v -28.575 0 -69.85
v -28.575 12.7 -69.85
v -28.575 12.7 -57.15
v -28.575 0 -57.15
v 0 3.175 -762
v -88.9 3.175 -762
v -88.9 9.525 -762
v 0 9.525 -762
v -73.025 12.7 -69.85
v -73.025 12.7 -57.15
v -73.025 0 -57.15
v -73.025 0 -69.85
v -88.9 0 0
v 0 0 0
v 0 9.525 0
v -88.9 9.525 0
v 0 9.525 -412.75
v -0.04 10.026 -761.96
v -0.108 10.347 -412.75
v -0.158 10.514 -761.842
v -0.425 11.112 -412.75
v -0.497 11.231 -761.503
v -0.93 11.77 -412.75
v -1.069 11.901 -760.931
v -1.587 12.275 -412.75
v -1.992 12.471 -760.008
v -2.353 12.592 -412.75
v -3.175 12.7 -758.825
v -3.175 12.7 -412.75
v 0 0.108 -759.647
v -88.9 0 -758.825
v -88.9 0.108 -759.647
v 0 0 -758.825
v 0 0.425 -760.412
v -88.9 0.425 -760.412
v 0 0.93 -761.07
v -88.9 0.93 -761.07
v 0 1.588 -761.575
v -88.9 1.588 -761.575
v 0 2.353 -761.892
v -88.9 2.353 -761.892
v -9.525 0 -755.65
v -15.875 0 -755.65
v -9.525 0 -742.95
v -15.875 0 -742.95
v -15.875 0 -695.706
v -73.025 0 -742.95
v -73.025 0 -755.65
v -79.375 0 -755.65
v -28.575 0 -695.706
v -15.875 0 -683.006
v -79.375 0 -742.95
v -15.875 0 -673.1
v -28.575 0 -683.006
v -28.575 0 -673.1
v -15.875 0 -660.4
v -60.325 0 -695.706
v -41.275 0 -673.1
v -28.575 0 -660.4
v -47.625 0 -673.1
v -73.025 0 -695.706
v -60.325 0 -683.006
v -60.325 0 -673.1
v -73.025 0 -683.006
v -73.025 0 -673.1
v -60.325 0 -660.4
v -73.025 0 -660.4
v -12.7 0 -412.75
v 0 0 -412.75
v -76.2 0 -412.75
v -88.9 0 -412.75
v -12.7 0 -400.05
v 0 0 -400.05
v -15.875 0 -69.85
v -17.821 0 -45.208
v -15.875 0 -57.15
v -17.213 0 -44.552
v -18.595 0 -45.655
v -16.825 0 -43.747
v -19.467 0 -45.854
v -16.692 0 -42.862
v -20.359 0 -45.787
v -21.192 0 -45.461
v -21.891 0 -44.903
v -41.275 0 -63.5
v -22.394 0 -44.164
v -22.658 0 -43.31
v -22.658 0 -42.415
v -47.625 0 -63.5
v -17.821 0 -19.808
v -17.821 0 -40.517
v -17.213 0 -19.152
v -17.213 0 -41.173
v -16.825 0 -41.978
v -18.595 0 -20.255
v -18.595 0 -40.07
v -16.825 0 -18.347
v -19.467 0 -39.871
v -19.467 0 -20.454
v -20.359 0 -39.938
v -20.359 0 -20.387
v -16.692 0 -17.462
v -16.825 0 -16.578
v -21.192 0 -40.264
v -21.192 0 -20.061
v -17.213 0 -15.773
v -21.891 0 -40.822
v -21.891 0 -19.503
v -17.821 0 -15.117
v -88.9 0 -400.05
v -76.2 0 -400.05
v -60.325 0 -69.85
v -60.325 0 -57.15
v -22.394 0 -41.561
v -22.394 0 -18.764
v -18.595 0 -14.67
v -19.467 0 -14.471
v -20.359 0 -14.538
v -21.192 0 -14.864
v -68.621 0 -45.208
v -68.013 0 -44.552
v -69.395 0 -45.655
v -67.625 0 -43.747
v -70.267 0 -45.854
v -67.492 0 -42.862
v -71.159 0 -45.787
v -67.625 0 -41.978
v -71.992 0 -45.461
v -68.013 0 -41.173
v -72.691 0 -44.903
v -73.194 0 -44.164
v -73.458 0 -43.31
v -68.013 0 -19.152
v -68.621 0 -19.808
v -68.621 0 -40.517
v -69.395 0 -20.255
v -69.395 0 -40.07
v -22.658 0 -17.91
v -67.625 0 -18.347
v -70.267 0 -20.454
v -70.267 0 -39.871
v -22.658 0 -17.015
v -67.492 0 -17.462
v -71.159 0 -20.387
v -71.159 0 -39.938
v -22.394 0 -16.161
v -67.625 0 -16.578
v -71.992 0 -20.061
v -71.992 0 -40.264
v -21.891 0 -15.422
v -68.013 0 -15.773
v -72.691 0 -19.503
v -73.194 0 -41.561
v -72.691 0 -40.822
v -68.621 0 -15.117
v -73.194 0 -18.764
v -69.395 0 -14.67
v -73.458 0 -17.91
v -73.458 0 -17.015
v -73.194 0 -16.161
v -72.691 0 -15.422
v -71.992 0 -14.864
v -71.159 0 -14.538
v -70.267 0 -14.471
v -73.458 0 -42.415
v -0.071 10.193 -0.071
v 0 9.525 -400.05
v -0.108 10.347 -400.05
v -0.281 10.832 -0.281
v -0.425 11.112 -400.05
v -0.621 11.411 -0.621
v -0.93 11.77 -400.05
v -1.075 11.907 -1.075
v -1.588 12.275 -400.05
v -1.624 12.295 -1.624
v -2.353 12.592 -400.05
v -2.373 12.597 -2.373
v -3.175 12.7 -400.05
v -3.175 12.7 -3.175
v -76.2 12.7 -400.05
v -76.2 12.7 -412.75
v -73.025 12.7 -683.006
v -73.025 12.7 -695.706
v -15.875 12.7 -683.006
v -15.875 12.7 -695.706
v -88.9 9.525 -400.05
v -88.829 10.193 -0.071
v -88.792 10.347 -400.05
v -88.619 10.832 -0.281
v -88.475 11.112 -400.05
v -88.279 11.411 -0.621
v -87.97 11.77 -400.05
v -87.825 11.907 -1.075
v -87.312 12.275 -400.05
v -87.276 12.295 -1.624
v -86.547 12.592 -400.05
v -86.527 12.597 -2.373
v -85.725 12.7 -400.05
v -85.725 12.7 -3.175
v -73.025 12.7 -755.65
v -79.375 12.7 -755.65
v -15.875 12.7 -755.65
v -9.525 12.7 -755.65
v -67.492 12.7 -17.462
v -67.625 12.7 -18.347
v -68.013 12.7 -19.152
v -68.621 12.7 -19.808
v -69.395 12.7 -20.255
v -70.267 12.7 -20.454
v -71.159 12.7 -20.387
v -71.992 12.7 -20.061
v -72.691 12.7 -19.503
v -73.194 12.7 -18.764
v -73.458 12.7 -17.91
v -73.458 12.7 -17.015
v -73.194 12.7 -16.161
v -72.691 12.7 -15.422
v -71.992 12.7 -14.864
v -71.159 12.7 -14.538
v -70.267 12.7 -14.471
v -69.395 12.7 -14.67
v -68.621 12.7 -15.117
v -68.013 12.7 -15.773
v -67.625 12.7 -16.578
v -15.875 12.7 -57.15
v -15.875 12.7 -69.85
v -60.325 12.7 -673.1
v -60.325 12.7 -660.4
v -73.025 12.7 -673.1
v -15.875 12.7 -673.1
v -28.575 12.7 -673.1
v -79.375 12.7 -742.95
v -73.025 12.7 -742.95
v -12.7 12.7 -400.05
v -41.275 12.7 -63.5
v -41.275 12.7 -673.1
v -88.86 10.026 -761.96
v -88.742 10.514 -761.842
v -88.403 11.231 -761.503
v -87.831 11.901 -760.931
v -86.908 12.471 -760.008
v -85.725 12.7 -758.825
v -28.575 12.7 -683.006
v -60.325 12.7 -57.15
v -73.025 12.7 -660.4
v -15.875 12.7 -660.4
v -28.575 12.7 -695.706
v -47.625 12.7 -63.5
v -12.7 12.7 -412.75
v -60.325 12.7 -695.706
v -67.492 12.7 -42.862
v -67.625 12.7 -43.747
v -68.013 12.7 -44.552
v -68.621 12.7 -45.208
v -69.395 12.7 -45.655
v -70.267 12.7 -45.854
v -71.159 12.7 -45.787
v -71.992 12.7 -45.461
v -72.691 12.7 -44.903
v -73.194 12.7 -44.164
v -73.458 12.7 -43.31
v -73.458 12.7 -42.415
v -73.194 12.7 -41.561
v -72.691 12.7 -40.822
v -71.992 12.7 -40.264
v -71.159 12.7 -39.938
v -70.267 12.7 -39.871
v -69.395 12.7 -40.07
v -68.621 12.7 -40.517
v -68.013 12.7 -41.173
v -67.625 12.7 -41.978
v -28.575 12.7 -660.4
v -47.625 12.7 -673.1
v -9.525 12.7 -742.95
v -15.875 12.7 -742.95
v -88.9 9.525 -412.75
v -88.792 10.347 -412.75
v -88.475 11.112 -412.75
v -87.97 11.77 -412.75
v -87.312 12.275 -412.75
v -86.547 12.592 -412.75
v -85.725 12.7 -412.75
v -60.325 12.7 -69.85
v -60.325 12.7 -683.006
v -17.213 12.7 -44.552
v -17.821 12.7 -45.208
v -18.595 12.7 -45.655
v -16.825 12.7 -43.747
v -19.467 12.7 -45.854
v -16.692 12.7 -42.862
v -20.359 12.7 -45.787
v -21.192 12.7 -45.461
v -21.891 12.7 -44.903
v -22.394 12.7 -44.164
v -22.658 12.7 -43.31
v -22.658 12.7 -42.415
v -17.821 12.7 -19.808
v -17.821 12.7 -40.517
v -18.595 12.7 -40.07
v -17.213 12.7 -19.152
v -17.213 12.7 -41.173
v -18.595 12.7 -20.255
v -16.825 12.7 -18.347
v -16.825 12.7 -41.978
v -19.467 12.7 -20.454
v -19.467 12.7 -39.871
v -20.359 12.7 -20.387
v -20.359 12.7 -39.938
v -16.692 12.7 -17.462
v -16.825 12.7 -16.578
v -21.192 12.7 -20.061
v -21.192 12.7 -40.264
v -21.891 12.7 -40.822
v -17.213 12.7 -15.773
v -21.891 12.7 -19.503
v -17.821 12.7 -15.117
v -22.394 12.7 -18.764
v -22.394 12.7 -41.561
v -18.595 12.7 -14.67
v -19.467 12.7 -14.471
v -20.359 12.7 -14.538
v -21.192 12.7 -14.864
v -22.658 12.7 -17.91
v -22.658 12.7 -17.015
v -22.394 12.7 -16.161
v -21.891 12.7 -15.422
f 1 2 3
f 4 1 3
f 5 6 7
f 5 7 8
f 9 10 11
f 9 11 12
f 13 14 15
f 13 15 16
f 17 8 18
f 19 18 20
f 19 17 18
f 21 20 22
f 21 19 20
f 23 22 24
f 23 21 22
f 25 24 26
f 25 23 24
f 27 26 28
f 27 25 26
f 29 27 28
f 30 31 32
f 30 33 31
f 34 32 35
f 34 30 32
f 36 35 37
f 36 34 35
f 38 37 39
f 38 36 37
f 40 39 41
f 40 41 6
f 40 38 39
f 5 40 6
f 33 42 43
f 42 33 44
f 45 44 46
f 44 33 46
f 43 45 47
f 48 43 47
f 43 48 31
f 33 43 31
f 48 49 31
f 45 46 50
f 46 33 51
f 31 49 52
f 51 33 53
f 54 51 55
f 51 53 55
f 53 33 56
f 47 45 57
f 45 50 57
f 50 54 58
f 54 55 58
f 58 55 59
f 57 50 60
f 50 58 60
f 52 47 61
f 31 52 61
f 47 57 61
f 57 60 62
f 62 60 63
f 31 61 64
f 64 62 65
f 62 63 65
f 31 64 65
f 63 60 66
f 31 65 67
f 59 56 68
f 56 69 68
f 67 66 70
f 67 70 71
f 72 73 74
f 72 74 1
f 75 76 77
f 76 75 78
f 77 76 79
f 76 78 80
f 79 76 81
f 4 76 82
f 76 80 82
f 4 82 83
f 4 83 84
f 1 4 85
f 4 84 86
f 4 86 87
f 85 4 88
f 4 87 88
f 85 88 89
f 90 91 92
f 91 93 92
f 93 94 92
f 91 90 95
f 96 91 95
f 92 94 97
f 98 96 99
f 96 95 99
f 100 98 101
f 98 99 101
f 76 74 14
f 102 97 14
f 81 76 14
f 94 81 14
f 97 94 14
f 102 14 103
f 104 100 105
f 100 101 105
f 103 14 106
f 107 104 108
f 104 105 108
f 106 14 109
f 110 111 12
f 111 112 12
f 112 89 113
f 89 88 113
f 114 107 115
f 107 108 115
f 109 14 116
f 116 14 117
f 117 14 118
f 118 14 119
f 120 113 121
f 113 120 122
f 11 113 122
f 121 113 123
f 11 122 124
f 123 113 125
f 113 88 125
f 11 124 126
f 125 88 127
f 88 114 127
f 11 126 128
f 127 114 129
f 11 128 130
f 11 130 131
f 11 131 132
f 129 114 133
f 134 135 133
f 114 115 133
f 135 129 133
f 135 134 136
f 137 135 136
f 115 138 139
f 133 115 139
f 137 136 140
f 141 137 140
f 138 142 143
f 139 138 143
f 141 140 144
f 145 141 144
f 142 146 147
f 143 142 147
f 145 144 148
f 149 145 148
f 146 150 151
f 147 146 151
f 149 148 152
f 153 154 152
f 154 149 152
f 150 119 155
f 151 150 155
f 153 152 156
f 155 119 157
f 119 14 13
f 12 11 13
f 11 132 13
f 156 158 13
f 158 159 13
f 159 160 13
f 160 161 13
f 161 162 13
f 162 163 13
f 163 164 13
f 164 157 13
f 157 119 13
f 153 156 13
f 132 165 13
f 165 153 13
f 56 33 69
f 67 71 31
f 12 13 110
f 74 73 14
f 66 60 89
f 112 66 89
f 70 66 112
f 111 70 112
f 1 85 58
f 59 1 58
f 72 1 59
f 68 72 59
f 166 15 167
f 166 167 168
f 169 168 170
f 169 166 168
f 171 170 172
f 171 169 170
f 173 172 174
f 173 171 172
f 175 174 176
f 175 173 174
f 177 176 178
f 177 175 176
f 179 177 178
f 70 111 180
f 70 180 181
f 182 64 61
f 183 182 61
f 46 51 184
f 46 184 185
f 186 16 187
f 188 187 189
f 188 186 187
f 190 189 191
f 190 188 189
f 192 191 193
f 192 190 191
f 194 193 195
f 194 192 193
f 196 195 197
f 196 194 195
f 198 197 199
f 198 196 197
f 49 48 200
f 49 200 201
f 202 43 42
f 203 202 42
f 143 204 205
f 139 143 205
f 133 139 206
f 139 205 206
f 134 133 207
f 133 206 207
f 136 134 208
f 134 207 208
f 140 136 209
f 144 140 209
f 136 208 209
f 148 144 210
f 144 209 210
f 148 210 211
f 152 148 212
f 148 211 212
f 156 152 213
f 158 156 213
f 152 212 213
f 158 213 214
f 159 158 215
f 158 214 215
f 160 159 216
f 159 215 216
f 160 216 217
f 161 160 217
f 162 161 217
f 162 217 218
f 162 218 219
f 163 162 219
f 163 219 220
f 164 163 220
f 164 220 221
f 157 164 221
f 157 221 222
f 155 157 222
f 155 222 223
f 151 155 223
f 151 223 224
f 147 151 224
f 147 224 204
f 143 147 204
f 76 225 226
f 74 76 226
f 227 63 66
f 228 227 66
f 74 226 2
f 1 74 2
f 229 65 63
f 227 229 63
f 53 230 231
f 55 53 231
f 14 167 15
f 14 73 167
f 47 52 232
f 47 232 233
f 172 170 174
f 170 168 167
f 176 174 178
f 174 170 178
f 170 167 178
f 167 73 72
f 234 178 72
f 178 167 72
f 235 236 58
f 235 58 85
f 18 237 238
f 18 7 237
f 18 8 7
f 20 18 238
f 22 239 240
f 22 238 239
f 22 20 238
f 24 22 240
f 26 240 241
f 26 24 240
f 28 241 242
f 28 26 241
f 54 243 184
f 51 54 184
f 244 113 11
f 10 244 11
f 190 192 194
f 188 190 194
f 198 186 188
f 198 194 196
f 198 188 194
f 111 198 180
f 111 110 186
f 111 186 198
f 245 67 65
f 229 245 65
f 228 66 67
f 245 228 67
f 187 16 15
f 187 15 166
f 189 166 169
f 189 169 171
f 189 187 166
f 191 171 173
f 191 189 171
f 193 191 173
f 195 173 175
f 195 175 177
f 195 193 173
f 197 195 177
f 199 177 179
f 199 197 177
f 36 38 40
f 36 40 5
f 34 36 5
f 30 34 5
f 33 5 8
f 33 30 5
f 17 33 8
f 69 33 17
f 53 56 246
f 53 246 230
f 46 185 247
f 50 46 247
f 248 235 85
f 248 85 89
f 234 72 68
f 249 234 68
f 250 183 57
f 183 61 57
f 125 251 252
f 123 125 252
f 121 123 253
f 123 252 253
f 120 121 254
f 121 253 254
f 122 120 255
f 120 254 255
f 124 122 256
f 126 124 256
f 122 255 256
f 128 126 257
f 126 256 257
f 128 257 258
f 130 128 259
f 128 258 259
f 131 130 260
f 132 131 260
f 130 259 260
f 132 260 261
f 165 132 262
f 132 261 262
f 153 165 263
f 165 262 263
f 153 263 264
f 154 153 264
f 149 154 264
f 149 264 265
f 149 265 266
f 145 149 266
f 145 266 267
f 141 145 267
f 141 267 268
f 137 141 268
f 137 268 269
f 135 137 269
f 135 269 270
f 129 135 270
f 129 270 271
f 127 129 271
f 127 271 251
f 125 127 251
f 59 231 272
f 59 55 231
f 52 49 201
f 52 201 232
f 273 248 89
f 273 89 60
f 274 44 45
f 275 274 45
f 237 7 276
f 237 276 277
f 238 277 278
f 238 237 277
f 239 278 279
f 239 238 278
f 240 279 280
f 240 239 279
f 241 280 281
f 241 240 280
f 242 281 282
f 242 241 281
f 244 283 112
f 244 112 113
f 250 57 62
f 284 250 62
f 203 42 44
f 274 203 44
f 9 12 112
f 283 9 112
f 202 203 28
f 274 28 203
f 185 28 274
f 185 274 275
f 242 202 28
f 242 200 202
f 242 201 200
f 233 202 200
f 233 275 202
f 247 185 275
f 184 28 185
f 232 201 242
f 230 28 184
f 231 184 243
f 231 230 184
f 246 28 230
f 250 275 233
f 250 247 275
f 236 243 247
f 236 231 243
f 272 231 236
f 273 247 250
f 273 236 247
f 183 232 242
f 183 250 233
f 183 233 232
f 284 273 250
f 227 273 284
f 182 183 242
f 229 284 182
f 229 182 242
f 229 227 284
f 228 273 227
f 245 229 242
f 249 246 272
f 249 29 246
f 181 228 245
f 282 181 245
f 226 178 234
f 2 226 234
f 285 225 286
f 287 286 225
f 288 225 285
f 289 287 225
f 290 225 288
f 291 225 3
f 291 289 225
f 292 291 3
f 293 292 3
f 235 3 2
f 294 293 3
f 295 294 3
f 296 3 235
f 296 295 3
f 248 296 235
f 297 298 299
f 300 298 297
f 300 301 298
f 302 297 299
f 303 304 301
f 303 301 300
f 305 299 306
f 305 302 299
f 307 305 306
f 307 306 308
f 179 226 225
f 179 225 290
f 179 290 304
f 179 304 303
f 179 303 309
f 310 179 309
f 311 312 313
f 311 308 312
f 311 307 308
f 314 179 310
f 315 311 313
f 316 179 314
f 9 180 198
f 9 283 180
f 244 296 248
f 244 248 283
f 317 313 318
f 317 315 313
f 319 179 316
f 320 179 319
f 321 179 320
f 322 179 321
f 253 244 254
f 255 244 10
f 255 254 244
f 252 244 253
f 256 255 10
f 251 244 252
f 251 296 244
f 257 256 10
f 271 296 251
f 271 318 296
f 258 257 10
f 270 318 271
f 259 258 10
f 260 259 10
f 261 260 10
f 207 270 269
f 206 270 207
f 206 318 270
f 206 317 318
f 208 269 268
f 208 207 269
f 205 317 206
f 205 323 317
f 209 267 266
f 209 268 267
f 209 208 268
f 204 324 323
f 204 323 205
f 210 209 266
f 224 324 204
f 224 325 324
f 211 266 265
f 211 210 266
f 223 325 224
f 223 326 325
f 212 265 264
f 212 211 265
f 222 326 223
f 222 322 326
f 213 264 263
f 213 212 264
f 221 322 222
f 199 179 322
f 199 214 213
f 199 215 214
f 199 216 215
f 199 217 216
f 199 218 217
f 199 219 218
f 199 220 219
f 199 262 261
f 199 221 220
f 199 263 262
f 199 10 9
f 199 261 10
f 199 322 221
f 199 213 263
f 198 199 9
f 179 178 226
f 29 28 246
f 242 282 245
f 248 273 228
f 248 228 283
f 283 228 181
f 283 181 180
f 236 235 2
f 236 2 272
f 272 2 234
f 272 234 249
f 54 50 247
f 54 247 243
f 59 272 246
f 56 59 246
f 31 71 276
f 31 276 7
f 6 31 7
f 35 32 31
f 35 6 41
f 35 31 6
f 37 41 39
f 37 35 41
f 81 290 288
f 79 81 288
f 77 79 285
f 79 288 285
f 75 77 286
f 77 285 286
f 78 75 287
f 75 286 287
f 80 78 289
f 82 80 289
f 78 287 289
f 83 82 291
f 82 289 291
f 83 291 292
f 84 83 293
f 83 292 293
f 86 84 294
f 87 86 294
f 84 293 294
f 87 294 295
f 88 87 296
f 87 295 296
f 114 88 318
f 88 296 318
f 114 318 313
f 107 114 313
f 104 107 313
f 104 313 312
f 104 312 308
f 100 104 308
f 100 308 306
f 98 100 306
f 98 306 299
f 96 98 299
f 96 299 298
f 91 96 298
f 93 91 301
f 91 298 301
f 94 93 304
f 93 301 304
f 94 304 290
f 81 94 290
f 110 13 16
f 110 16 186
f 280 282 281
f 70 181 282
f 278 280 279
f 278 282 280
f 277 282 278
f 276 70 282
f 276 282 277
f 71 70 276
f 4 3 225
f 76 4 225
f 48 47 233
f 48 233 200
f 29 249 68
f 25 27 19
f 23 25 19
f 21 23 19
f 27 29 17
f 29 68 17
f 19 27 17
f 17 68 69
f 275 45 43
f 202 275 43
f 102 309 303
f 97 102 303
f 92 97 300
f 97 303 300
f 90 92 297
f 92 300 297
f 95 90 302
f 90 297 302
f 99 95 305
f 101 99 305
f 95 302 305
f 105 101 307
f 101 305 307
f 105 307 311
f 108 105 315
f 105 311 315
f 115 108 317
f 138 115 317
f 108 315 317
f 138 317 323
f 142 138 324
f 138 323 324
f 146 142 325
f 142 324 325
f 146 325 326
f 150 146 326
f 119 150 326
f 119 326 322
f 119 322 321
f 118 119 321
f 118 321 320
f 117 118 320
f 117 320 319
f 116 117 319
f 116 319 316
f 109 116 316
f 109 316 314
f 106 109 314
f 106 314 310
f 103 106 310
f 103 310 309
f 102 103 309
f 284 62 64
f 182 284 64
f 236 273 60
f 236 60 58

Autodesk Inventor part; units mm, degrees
ref_plane "YZ Plane" through (0, 0, 0) normal (1, 0, 0) x (0, 1, 0)
ref_plane "XZ Plane" through (0, 0, 0) normal (0, 1, 0) x (-1, 0, 0)
ref_plane "XY Plane" through (0, 0, 0) normal (0, 0, 1) x (1, 0, 0)
sketch "Sketch1" plane through (0, 0, 0) normal (0, 1, 0) x (-1, 0, 0)
  line L0 (0, 0) -> (88.9, 0)
  line L1 (88.9, -762) -> (0, -762)
  line L2 (0, -762) -> (0, 0)
  line L3 (88.9, 0) -> (0, 0) construction
  line L4 (0, 0) -> (0, -50.8) construction
  line L5 (88.9, 0) -> (88.9, -762)
  dimension "d0" = 88.9
  dimension "d3" = 50.8
  dimension "d47" = 762
extrude "Extrusion3" add sketch "Sketch1" along normal blind 12.7
sketch "Sketch2" plane through (0, 12.7, 0) normal (0, 1, 0) x (1, 0, 0)
  line L0 (0, 762) -> (-88.9, 762) construction
  line L1 (-44.45, 762) -> (666.75, 762) construction
  line L2 (-41.275, 63.5) -> (-47.625, 63.5)
  line L3 (-47.625, 63.5) -> (-47.625, 673.1)
  line L4 (-47.625, 673.1) -> (-41.275, 673.1)
  line L5 (-41.275, 673.1) -> (-41.275, 63.5)
  line L6 (-44.45, 63.5) -> (-44.45, 0) construction
  line L7 (-88.9, 0) -> (0, 0) construction
  dimension "d21" = 6.35
  dimension "d22" = 609.6
  dimension "d25" = 63.5
extrude "Extrusion4" cut sketch "Sketch2" against normal through all
sketch "Sketch3" plane through (0, 0, 0) normal (0, -1, 0) x (1, 0, 0)
  line L0 (-41.275, -673.1) -> (-41.275, -63.5) construction
  line L1 (-41.275, -63.5) -> (-22.225, -63.5) construction
  line L2 (-47.625, -63.5) -> (-41.275, -63.5) construction
  line L3 (-44.45, -63.5) -> (-44.45, 0) construction
  line L4 (-47.625, -63.5) -> (-66.675, -63.5) construction
  line L5 (-28.575, -57.15) -> (-15.875, -57.15)
  line L6 (-15.875, -57.15) -> (-15.875, -69.85)
  line L7 (-15.875, -69.85) -> (-28.575, -69.85)
  line L8 (-28.575, -69.85) -> (-28.575, -57.15)
  line L9 (-28.575, -57.15) -> (-15.875, -69.85) construction
  line L10 (-15.875, -57.15) -> (-28.575, -69.85) construction
  line L11 (-60.325, -57.15) -> (-73.025, -57.15)
  line L12 (-73.025, -57.15) -> (-73.025, -69.85)
  line L13 (-73.025, -69.85) -> (-60.325, -69.85)
  line L14 (-60.325, -69.85) -> (-60.325, -57.15)
  line L15 (-60.325, -57.15) -> (-73.025, -69.85) construction
  line L16 (-73.025, -57.15) -> (-60.325, -69.85) construction
  line L17 (-28.575, -660.4) -> (-15.875, -660.4)
  line L18 (-15.875, -660.4) -> (-15.875, -673.1)
  line L19 (-15.875, -673.1) -> (-28.575, -673.1)
  line L20 (-28.575, -673.1) -> (-28.575, -660.4)
  line L21 (-28.575, -660.4) -> (-15.875, -673.1) construction
  line L22 (-15.875, -660.4) -> (-28.575, -673.1) construction
  line L23 (-60.325, -660.4) -> (-73.025, -660.4)
  line L24 (-73.025, -660.4) -> (-73.025, -673.1)
  line L25 (-73.025, -673.1) -> (-60.325, -673.1)
  line L26 (-60.325, -673.1) -> (-60.325, -660.4)
  line L27 (-60.325, -660.4) -> (-73.025, -673.1) construction
  line L28 (-73.025, -660.4) -> (-60.325, -673.1) construction
  line L29 (-47.625, -673.1) -> (-41.275, -673.1) construction
  line L30 (-28.575, -673.1) -> (-60.325, -673.1) construction
  line L31 (-44.45, -673.1) -> (-44.45, -695.706) construction
  line L32 (-44.45, -673.1) -> (-21.844, -673.1) construction
  line L33 (-28.575, -695.706) -> (-28.575, -683.006)
  line L34 (-15.875, -695.706) -> (-28.575, -695.706)
  line L35 (-15.875, -683.006) -> (-15.875, -695.706)
  line L36 (-15.875, -683.006) -> (-28.575, -695.706) construction
  line L37 (-28.575, -683.006) -> (-15.875, -683.006)
  line L38 (-28.575, -683.006) -> (-15.875, -695.706) construction
  line L39 (-60.325, -695.706) -> (-60.325, -683.006)
  line L40 (-60.325, -683.006) -> (-73.025, -683.006)
  line L41 (-73.025, -683.006) -> (-73.025, -695.706)
  line L42 (-60.325, -683.006) -> (-73.025, -695.706) construction
  line L43 (-73.025, -683.006) -> (-60.325, -695.706) construction
  line L44 (-73.025, -695.706) -> (-60.325, -695.706)
  line L45 (-28.575, -695.706) -> (-60.325, -695.706) construction
  line L46 (0, -762) -> (-88.9, -762) construction
  line L47 (-44.45, -762) -> (-44.45, -755.65) construction
  line L48 (-44.45, -755.65) -> (-15.875, -755.65) construction
  line L49 (-15.875, -755.65) -> (-9.525, -755.65)
  line L50 (-9.525, -755.65) -> (-9.525, -742.95)
  line L51 (-9.525, -742.95) -> (-15.875, -742.95)
  line L52 (-15.875, -742.95) -> (-15.875, -755.65)
  line L53 (-73.025, -755.65) -> (-79.375, -755.65)
  line L54 (-79.375, -755.65) -> (-79.375, -742.95)
  line L55 (-79.375, -742.95) -> (-73.025, -742.95)
  line L56 (-73.025, -742.95) -> (-73.025, -755.65)
  point P0 (0, 0)
  point P1 (-22.225, -666.75)
  point P2 (-66.675, -666.75)
  point P3 (-22.225, -689.356)
  point P4 (-66.675, -689.356)
  point P5 (-21.844, -695.706)
  dimension "d26" = 19.05
  dimension "d27" = 12.7
  dimension "d28" = 12.7
  dimension "d29" = 12.7
  dimension "d30" = 12.7
  dimension "d33" = 12.7
  dimension "d34" = 12.7
  dimension "d35" = 12.7
  dimension "d36" = 12.7
  dimension "d37" = 22.606
  dimension "d38" = 90
  dimension "d39" = 12.7
  dimension "d40" = 12.7
  dimension "d41" = 12.7
  dimension "d42" = 12.7
  dimension "d43" = 6.35
  dimension "d44" = 28.575
  dimension "d45" = 6.35
  dimension "d46" = 12.7
extrude "Extrusion5" cut sketch "Sketch3" against normal through all
sketch "Sketch4" plane through (0, 0, 0) normal (0, -1, 0) x (1, 0, 0)
  line L0 (-88.9, -406.4) -> (0, -406.4) construction
  line L1 (-88.9, -400.05) -> (-76.2, -400.05)
  line L2 (-76.2, -400.05) -> (-76.2, -412.75)
  line L3 (-76.2, -412.75) -> (-88.9, -412.75)
  line L4 (-88.9, -400.05) -> (-88.9, -412.75)
  line L5 (0, -400.05) -> (-12.7, -400.05)
  line L6 (-12.7, -400.05) -> (-12.7, -412.75)
  line L7 (-12.7, -412.75) -> (0, -412.75)
  line L8 (0, -400.05) -> (0, -412.75)
  line L9 (-15.875, -742.95) -> (-15.875, -755.65) construction
  line L10 (-79.375, -755.65) -> (-73.025, -755.65) construction
  line L11 (-15.875, -755.65) -> (-73.025, -755.65) construction
  line L12 (-28.575, -69.85) -> (-28.575, -57.15) construction
  line L13 (-28.575, -57.15) -> (-60.325, -57.15) construction
  line L14 (-44.45, -57.15) -> (-44.45, -755.65) construction
  point P0 (-44.45, -406.4)
  dimension "d49" = 12.7
  dimension "d52" = 12.7
extrude "Extrusion6" cut sketch "Sketch4" against normal through all
fillet "Fillet1" radius 3.175 6 edges at (0, 12.7, -200.025) (-44.45, 12.7, 0) (-88.9, 12.7, -200.025) (0, 12.7, -587.375) (-44.45, 12.7, -762) (-88.9, 12.7, -587.375)
fillet "Fillet2" radius 3.175 1 edges at (-44.45, 0, -762)
sketch "Sketch5" plane through (0, 12.7, 0) normal (0, 1, 0) x (1, 0, 0)
  line L0 (-85.725, 3.175) -> (-85.725, 400.05) construction
  line L1 (-3.175, 400.05) -> (-3.175, 3.175) construction
  line L2 (-85.725, 57.15) -> (-3.175, 57.15) construction
  line L3 (-3.175, 57.15) -> (-3.175, 3.175) construction
  line L4 (-3.175, 3.175) -> (-85.725, 3.175) construction
  line L5 (-85.725, 3.175) -> (-85.725, 57.15) construction
  line L6 (-85.725, 57.15) -> (-4.458, 3.175) construction
  line L7 (-70.4915, 17.4625) -> (-19.6915, 17.4625) construction
  line L8 (-19.6915, 17.4625) -> (-19.6915, 42.8625) construction
  line L9 (-19.6915, 42.8625) -> (-70.4915, 42.8625) construction
  line L10 (-70.4915, 42.8625) -> (-70.4915, 17.4625) construction
  line L11 (-70.4915, 17.4625) -> (-19.6915, 42.8625) construction
  line L12 (-19.6915, 17.4625) -> (-70.4915, 42.8625) construction
  circle A0 centre (-70.4915, 42.8625) radius 3
  circle A1 centre (-19.6915, 42.8625) radius 3
  circle A2 centre (-19.6915, 17.4625) radius 3
  circle A3 centre (-70.4915, 17.4625) radius 3
  point P0 (0, 0)
  point P1 (-45.0915, 30.1625)
  dimension "d64" = 50.8
  dimension "d65" = 25.4
  dimension "d66" = 6
  dimension "d67" = 6
  dimension "d68" = 6
  dimension "d69" = 6
extrude "Extrusion7" cut sketch "Sketch5" against normal through all
properties part number "Arm Base" material "PVC-Piping"
